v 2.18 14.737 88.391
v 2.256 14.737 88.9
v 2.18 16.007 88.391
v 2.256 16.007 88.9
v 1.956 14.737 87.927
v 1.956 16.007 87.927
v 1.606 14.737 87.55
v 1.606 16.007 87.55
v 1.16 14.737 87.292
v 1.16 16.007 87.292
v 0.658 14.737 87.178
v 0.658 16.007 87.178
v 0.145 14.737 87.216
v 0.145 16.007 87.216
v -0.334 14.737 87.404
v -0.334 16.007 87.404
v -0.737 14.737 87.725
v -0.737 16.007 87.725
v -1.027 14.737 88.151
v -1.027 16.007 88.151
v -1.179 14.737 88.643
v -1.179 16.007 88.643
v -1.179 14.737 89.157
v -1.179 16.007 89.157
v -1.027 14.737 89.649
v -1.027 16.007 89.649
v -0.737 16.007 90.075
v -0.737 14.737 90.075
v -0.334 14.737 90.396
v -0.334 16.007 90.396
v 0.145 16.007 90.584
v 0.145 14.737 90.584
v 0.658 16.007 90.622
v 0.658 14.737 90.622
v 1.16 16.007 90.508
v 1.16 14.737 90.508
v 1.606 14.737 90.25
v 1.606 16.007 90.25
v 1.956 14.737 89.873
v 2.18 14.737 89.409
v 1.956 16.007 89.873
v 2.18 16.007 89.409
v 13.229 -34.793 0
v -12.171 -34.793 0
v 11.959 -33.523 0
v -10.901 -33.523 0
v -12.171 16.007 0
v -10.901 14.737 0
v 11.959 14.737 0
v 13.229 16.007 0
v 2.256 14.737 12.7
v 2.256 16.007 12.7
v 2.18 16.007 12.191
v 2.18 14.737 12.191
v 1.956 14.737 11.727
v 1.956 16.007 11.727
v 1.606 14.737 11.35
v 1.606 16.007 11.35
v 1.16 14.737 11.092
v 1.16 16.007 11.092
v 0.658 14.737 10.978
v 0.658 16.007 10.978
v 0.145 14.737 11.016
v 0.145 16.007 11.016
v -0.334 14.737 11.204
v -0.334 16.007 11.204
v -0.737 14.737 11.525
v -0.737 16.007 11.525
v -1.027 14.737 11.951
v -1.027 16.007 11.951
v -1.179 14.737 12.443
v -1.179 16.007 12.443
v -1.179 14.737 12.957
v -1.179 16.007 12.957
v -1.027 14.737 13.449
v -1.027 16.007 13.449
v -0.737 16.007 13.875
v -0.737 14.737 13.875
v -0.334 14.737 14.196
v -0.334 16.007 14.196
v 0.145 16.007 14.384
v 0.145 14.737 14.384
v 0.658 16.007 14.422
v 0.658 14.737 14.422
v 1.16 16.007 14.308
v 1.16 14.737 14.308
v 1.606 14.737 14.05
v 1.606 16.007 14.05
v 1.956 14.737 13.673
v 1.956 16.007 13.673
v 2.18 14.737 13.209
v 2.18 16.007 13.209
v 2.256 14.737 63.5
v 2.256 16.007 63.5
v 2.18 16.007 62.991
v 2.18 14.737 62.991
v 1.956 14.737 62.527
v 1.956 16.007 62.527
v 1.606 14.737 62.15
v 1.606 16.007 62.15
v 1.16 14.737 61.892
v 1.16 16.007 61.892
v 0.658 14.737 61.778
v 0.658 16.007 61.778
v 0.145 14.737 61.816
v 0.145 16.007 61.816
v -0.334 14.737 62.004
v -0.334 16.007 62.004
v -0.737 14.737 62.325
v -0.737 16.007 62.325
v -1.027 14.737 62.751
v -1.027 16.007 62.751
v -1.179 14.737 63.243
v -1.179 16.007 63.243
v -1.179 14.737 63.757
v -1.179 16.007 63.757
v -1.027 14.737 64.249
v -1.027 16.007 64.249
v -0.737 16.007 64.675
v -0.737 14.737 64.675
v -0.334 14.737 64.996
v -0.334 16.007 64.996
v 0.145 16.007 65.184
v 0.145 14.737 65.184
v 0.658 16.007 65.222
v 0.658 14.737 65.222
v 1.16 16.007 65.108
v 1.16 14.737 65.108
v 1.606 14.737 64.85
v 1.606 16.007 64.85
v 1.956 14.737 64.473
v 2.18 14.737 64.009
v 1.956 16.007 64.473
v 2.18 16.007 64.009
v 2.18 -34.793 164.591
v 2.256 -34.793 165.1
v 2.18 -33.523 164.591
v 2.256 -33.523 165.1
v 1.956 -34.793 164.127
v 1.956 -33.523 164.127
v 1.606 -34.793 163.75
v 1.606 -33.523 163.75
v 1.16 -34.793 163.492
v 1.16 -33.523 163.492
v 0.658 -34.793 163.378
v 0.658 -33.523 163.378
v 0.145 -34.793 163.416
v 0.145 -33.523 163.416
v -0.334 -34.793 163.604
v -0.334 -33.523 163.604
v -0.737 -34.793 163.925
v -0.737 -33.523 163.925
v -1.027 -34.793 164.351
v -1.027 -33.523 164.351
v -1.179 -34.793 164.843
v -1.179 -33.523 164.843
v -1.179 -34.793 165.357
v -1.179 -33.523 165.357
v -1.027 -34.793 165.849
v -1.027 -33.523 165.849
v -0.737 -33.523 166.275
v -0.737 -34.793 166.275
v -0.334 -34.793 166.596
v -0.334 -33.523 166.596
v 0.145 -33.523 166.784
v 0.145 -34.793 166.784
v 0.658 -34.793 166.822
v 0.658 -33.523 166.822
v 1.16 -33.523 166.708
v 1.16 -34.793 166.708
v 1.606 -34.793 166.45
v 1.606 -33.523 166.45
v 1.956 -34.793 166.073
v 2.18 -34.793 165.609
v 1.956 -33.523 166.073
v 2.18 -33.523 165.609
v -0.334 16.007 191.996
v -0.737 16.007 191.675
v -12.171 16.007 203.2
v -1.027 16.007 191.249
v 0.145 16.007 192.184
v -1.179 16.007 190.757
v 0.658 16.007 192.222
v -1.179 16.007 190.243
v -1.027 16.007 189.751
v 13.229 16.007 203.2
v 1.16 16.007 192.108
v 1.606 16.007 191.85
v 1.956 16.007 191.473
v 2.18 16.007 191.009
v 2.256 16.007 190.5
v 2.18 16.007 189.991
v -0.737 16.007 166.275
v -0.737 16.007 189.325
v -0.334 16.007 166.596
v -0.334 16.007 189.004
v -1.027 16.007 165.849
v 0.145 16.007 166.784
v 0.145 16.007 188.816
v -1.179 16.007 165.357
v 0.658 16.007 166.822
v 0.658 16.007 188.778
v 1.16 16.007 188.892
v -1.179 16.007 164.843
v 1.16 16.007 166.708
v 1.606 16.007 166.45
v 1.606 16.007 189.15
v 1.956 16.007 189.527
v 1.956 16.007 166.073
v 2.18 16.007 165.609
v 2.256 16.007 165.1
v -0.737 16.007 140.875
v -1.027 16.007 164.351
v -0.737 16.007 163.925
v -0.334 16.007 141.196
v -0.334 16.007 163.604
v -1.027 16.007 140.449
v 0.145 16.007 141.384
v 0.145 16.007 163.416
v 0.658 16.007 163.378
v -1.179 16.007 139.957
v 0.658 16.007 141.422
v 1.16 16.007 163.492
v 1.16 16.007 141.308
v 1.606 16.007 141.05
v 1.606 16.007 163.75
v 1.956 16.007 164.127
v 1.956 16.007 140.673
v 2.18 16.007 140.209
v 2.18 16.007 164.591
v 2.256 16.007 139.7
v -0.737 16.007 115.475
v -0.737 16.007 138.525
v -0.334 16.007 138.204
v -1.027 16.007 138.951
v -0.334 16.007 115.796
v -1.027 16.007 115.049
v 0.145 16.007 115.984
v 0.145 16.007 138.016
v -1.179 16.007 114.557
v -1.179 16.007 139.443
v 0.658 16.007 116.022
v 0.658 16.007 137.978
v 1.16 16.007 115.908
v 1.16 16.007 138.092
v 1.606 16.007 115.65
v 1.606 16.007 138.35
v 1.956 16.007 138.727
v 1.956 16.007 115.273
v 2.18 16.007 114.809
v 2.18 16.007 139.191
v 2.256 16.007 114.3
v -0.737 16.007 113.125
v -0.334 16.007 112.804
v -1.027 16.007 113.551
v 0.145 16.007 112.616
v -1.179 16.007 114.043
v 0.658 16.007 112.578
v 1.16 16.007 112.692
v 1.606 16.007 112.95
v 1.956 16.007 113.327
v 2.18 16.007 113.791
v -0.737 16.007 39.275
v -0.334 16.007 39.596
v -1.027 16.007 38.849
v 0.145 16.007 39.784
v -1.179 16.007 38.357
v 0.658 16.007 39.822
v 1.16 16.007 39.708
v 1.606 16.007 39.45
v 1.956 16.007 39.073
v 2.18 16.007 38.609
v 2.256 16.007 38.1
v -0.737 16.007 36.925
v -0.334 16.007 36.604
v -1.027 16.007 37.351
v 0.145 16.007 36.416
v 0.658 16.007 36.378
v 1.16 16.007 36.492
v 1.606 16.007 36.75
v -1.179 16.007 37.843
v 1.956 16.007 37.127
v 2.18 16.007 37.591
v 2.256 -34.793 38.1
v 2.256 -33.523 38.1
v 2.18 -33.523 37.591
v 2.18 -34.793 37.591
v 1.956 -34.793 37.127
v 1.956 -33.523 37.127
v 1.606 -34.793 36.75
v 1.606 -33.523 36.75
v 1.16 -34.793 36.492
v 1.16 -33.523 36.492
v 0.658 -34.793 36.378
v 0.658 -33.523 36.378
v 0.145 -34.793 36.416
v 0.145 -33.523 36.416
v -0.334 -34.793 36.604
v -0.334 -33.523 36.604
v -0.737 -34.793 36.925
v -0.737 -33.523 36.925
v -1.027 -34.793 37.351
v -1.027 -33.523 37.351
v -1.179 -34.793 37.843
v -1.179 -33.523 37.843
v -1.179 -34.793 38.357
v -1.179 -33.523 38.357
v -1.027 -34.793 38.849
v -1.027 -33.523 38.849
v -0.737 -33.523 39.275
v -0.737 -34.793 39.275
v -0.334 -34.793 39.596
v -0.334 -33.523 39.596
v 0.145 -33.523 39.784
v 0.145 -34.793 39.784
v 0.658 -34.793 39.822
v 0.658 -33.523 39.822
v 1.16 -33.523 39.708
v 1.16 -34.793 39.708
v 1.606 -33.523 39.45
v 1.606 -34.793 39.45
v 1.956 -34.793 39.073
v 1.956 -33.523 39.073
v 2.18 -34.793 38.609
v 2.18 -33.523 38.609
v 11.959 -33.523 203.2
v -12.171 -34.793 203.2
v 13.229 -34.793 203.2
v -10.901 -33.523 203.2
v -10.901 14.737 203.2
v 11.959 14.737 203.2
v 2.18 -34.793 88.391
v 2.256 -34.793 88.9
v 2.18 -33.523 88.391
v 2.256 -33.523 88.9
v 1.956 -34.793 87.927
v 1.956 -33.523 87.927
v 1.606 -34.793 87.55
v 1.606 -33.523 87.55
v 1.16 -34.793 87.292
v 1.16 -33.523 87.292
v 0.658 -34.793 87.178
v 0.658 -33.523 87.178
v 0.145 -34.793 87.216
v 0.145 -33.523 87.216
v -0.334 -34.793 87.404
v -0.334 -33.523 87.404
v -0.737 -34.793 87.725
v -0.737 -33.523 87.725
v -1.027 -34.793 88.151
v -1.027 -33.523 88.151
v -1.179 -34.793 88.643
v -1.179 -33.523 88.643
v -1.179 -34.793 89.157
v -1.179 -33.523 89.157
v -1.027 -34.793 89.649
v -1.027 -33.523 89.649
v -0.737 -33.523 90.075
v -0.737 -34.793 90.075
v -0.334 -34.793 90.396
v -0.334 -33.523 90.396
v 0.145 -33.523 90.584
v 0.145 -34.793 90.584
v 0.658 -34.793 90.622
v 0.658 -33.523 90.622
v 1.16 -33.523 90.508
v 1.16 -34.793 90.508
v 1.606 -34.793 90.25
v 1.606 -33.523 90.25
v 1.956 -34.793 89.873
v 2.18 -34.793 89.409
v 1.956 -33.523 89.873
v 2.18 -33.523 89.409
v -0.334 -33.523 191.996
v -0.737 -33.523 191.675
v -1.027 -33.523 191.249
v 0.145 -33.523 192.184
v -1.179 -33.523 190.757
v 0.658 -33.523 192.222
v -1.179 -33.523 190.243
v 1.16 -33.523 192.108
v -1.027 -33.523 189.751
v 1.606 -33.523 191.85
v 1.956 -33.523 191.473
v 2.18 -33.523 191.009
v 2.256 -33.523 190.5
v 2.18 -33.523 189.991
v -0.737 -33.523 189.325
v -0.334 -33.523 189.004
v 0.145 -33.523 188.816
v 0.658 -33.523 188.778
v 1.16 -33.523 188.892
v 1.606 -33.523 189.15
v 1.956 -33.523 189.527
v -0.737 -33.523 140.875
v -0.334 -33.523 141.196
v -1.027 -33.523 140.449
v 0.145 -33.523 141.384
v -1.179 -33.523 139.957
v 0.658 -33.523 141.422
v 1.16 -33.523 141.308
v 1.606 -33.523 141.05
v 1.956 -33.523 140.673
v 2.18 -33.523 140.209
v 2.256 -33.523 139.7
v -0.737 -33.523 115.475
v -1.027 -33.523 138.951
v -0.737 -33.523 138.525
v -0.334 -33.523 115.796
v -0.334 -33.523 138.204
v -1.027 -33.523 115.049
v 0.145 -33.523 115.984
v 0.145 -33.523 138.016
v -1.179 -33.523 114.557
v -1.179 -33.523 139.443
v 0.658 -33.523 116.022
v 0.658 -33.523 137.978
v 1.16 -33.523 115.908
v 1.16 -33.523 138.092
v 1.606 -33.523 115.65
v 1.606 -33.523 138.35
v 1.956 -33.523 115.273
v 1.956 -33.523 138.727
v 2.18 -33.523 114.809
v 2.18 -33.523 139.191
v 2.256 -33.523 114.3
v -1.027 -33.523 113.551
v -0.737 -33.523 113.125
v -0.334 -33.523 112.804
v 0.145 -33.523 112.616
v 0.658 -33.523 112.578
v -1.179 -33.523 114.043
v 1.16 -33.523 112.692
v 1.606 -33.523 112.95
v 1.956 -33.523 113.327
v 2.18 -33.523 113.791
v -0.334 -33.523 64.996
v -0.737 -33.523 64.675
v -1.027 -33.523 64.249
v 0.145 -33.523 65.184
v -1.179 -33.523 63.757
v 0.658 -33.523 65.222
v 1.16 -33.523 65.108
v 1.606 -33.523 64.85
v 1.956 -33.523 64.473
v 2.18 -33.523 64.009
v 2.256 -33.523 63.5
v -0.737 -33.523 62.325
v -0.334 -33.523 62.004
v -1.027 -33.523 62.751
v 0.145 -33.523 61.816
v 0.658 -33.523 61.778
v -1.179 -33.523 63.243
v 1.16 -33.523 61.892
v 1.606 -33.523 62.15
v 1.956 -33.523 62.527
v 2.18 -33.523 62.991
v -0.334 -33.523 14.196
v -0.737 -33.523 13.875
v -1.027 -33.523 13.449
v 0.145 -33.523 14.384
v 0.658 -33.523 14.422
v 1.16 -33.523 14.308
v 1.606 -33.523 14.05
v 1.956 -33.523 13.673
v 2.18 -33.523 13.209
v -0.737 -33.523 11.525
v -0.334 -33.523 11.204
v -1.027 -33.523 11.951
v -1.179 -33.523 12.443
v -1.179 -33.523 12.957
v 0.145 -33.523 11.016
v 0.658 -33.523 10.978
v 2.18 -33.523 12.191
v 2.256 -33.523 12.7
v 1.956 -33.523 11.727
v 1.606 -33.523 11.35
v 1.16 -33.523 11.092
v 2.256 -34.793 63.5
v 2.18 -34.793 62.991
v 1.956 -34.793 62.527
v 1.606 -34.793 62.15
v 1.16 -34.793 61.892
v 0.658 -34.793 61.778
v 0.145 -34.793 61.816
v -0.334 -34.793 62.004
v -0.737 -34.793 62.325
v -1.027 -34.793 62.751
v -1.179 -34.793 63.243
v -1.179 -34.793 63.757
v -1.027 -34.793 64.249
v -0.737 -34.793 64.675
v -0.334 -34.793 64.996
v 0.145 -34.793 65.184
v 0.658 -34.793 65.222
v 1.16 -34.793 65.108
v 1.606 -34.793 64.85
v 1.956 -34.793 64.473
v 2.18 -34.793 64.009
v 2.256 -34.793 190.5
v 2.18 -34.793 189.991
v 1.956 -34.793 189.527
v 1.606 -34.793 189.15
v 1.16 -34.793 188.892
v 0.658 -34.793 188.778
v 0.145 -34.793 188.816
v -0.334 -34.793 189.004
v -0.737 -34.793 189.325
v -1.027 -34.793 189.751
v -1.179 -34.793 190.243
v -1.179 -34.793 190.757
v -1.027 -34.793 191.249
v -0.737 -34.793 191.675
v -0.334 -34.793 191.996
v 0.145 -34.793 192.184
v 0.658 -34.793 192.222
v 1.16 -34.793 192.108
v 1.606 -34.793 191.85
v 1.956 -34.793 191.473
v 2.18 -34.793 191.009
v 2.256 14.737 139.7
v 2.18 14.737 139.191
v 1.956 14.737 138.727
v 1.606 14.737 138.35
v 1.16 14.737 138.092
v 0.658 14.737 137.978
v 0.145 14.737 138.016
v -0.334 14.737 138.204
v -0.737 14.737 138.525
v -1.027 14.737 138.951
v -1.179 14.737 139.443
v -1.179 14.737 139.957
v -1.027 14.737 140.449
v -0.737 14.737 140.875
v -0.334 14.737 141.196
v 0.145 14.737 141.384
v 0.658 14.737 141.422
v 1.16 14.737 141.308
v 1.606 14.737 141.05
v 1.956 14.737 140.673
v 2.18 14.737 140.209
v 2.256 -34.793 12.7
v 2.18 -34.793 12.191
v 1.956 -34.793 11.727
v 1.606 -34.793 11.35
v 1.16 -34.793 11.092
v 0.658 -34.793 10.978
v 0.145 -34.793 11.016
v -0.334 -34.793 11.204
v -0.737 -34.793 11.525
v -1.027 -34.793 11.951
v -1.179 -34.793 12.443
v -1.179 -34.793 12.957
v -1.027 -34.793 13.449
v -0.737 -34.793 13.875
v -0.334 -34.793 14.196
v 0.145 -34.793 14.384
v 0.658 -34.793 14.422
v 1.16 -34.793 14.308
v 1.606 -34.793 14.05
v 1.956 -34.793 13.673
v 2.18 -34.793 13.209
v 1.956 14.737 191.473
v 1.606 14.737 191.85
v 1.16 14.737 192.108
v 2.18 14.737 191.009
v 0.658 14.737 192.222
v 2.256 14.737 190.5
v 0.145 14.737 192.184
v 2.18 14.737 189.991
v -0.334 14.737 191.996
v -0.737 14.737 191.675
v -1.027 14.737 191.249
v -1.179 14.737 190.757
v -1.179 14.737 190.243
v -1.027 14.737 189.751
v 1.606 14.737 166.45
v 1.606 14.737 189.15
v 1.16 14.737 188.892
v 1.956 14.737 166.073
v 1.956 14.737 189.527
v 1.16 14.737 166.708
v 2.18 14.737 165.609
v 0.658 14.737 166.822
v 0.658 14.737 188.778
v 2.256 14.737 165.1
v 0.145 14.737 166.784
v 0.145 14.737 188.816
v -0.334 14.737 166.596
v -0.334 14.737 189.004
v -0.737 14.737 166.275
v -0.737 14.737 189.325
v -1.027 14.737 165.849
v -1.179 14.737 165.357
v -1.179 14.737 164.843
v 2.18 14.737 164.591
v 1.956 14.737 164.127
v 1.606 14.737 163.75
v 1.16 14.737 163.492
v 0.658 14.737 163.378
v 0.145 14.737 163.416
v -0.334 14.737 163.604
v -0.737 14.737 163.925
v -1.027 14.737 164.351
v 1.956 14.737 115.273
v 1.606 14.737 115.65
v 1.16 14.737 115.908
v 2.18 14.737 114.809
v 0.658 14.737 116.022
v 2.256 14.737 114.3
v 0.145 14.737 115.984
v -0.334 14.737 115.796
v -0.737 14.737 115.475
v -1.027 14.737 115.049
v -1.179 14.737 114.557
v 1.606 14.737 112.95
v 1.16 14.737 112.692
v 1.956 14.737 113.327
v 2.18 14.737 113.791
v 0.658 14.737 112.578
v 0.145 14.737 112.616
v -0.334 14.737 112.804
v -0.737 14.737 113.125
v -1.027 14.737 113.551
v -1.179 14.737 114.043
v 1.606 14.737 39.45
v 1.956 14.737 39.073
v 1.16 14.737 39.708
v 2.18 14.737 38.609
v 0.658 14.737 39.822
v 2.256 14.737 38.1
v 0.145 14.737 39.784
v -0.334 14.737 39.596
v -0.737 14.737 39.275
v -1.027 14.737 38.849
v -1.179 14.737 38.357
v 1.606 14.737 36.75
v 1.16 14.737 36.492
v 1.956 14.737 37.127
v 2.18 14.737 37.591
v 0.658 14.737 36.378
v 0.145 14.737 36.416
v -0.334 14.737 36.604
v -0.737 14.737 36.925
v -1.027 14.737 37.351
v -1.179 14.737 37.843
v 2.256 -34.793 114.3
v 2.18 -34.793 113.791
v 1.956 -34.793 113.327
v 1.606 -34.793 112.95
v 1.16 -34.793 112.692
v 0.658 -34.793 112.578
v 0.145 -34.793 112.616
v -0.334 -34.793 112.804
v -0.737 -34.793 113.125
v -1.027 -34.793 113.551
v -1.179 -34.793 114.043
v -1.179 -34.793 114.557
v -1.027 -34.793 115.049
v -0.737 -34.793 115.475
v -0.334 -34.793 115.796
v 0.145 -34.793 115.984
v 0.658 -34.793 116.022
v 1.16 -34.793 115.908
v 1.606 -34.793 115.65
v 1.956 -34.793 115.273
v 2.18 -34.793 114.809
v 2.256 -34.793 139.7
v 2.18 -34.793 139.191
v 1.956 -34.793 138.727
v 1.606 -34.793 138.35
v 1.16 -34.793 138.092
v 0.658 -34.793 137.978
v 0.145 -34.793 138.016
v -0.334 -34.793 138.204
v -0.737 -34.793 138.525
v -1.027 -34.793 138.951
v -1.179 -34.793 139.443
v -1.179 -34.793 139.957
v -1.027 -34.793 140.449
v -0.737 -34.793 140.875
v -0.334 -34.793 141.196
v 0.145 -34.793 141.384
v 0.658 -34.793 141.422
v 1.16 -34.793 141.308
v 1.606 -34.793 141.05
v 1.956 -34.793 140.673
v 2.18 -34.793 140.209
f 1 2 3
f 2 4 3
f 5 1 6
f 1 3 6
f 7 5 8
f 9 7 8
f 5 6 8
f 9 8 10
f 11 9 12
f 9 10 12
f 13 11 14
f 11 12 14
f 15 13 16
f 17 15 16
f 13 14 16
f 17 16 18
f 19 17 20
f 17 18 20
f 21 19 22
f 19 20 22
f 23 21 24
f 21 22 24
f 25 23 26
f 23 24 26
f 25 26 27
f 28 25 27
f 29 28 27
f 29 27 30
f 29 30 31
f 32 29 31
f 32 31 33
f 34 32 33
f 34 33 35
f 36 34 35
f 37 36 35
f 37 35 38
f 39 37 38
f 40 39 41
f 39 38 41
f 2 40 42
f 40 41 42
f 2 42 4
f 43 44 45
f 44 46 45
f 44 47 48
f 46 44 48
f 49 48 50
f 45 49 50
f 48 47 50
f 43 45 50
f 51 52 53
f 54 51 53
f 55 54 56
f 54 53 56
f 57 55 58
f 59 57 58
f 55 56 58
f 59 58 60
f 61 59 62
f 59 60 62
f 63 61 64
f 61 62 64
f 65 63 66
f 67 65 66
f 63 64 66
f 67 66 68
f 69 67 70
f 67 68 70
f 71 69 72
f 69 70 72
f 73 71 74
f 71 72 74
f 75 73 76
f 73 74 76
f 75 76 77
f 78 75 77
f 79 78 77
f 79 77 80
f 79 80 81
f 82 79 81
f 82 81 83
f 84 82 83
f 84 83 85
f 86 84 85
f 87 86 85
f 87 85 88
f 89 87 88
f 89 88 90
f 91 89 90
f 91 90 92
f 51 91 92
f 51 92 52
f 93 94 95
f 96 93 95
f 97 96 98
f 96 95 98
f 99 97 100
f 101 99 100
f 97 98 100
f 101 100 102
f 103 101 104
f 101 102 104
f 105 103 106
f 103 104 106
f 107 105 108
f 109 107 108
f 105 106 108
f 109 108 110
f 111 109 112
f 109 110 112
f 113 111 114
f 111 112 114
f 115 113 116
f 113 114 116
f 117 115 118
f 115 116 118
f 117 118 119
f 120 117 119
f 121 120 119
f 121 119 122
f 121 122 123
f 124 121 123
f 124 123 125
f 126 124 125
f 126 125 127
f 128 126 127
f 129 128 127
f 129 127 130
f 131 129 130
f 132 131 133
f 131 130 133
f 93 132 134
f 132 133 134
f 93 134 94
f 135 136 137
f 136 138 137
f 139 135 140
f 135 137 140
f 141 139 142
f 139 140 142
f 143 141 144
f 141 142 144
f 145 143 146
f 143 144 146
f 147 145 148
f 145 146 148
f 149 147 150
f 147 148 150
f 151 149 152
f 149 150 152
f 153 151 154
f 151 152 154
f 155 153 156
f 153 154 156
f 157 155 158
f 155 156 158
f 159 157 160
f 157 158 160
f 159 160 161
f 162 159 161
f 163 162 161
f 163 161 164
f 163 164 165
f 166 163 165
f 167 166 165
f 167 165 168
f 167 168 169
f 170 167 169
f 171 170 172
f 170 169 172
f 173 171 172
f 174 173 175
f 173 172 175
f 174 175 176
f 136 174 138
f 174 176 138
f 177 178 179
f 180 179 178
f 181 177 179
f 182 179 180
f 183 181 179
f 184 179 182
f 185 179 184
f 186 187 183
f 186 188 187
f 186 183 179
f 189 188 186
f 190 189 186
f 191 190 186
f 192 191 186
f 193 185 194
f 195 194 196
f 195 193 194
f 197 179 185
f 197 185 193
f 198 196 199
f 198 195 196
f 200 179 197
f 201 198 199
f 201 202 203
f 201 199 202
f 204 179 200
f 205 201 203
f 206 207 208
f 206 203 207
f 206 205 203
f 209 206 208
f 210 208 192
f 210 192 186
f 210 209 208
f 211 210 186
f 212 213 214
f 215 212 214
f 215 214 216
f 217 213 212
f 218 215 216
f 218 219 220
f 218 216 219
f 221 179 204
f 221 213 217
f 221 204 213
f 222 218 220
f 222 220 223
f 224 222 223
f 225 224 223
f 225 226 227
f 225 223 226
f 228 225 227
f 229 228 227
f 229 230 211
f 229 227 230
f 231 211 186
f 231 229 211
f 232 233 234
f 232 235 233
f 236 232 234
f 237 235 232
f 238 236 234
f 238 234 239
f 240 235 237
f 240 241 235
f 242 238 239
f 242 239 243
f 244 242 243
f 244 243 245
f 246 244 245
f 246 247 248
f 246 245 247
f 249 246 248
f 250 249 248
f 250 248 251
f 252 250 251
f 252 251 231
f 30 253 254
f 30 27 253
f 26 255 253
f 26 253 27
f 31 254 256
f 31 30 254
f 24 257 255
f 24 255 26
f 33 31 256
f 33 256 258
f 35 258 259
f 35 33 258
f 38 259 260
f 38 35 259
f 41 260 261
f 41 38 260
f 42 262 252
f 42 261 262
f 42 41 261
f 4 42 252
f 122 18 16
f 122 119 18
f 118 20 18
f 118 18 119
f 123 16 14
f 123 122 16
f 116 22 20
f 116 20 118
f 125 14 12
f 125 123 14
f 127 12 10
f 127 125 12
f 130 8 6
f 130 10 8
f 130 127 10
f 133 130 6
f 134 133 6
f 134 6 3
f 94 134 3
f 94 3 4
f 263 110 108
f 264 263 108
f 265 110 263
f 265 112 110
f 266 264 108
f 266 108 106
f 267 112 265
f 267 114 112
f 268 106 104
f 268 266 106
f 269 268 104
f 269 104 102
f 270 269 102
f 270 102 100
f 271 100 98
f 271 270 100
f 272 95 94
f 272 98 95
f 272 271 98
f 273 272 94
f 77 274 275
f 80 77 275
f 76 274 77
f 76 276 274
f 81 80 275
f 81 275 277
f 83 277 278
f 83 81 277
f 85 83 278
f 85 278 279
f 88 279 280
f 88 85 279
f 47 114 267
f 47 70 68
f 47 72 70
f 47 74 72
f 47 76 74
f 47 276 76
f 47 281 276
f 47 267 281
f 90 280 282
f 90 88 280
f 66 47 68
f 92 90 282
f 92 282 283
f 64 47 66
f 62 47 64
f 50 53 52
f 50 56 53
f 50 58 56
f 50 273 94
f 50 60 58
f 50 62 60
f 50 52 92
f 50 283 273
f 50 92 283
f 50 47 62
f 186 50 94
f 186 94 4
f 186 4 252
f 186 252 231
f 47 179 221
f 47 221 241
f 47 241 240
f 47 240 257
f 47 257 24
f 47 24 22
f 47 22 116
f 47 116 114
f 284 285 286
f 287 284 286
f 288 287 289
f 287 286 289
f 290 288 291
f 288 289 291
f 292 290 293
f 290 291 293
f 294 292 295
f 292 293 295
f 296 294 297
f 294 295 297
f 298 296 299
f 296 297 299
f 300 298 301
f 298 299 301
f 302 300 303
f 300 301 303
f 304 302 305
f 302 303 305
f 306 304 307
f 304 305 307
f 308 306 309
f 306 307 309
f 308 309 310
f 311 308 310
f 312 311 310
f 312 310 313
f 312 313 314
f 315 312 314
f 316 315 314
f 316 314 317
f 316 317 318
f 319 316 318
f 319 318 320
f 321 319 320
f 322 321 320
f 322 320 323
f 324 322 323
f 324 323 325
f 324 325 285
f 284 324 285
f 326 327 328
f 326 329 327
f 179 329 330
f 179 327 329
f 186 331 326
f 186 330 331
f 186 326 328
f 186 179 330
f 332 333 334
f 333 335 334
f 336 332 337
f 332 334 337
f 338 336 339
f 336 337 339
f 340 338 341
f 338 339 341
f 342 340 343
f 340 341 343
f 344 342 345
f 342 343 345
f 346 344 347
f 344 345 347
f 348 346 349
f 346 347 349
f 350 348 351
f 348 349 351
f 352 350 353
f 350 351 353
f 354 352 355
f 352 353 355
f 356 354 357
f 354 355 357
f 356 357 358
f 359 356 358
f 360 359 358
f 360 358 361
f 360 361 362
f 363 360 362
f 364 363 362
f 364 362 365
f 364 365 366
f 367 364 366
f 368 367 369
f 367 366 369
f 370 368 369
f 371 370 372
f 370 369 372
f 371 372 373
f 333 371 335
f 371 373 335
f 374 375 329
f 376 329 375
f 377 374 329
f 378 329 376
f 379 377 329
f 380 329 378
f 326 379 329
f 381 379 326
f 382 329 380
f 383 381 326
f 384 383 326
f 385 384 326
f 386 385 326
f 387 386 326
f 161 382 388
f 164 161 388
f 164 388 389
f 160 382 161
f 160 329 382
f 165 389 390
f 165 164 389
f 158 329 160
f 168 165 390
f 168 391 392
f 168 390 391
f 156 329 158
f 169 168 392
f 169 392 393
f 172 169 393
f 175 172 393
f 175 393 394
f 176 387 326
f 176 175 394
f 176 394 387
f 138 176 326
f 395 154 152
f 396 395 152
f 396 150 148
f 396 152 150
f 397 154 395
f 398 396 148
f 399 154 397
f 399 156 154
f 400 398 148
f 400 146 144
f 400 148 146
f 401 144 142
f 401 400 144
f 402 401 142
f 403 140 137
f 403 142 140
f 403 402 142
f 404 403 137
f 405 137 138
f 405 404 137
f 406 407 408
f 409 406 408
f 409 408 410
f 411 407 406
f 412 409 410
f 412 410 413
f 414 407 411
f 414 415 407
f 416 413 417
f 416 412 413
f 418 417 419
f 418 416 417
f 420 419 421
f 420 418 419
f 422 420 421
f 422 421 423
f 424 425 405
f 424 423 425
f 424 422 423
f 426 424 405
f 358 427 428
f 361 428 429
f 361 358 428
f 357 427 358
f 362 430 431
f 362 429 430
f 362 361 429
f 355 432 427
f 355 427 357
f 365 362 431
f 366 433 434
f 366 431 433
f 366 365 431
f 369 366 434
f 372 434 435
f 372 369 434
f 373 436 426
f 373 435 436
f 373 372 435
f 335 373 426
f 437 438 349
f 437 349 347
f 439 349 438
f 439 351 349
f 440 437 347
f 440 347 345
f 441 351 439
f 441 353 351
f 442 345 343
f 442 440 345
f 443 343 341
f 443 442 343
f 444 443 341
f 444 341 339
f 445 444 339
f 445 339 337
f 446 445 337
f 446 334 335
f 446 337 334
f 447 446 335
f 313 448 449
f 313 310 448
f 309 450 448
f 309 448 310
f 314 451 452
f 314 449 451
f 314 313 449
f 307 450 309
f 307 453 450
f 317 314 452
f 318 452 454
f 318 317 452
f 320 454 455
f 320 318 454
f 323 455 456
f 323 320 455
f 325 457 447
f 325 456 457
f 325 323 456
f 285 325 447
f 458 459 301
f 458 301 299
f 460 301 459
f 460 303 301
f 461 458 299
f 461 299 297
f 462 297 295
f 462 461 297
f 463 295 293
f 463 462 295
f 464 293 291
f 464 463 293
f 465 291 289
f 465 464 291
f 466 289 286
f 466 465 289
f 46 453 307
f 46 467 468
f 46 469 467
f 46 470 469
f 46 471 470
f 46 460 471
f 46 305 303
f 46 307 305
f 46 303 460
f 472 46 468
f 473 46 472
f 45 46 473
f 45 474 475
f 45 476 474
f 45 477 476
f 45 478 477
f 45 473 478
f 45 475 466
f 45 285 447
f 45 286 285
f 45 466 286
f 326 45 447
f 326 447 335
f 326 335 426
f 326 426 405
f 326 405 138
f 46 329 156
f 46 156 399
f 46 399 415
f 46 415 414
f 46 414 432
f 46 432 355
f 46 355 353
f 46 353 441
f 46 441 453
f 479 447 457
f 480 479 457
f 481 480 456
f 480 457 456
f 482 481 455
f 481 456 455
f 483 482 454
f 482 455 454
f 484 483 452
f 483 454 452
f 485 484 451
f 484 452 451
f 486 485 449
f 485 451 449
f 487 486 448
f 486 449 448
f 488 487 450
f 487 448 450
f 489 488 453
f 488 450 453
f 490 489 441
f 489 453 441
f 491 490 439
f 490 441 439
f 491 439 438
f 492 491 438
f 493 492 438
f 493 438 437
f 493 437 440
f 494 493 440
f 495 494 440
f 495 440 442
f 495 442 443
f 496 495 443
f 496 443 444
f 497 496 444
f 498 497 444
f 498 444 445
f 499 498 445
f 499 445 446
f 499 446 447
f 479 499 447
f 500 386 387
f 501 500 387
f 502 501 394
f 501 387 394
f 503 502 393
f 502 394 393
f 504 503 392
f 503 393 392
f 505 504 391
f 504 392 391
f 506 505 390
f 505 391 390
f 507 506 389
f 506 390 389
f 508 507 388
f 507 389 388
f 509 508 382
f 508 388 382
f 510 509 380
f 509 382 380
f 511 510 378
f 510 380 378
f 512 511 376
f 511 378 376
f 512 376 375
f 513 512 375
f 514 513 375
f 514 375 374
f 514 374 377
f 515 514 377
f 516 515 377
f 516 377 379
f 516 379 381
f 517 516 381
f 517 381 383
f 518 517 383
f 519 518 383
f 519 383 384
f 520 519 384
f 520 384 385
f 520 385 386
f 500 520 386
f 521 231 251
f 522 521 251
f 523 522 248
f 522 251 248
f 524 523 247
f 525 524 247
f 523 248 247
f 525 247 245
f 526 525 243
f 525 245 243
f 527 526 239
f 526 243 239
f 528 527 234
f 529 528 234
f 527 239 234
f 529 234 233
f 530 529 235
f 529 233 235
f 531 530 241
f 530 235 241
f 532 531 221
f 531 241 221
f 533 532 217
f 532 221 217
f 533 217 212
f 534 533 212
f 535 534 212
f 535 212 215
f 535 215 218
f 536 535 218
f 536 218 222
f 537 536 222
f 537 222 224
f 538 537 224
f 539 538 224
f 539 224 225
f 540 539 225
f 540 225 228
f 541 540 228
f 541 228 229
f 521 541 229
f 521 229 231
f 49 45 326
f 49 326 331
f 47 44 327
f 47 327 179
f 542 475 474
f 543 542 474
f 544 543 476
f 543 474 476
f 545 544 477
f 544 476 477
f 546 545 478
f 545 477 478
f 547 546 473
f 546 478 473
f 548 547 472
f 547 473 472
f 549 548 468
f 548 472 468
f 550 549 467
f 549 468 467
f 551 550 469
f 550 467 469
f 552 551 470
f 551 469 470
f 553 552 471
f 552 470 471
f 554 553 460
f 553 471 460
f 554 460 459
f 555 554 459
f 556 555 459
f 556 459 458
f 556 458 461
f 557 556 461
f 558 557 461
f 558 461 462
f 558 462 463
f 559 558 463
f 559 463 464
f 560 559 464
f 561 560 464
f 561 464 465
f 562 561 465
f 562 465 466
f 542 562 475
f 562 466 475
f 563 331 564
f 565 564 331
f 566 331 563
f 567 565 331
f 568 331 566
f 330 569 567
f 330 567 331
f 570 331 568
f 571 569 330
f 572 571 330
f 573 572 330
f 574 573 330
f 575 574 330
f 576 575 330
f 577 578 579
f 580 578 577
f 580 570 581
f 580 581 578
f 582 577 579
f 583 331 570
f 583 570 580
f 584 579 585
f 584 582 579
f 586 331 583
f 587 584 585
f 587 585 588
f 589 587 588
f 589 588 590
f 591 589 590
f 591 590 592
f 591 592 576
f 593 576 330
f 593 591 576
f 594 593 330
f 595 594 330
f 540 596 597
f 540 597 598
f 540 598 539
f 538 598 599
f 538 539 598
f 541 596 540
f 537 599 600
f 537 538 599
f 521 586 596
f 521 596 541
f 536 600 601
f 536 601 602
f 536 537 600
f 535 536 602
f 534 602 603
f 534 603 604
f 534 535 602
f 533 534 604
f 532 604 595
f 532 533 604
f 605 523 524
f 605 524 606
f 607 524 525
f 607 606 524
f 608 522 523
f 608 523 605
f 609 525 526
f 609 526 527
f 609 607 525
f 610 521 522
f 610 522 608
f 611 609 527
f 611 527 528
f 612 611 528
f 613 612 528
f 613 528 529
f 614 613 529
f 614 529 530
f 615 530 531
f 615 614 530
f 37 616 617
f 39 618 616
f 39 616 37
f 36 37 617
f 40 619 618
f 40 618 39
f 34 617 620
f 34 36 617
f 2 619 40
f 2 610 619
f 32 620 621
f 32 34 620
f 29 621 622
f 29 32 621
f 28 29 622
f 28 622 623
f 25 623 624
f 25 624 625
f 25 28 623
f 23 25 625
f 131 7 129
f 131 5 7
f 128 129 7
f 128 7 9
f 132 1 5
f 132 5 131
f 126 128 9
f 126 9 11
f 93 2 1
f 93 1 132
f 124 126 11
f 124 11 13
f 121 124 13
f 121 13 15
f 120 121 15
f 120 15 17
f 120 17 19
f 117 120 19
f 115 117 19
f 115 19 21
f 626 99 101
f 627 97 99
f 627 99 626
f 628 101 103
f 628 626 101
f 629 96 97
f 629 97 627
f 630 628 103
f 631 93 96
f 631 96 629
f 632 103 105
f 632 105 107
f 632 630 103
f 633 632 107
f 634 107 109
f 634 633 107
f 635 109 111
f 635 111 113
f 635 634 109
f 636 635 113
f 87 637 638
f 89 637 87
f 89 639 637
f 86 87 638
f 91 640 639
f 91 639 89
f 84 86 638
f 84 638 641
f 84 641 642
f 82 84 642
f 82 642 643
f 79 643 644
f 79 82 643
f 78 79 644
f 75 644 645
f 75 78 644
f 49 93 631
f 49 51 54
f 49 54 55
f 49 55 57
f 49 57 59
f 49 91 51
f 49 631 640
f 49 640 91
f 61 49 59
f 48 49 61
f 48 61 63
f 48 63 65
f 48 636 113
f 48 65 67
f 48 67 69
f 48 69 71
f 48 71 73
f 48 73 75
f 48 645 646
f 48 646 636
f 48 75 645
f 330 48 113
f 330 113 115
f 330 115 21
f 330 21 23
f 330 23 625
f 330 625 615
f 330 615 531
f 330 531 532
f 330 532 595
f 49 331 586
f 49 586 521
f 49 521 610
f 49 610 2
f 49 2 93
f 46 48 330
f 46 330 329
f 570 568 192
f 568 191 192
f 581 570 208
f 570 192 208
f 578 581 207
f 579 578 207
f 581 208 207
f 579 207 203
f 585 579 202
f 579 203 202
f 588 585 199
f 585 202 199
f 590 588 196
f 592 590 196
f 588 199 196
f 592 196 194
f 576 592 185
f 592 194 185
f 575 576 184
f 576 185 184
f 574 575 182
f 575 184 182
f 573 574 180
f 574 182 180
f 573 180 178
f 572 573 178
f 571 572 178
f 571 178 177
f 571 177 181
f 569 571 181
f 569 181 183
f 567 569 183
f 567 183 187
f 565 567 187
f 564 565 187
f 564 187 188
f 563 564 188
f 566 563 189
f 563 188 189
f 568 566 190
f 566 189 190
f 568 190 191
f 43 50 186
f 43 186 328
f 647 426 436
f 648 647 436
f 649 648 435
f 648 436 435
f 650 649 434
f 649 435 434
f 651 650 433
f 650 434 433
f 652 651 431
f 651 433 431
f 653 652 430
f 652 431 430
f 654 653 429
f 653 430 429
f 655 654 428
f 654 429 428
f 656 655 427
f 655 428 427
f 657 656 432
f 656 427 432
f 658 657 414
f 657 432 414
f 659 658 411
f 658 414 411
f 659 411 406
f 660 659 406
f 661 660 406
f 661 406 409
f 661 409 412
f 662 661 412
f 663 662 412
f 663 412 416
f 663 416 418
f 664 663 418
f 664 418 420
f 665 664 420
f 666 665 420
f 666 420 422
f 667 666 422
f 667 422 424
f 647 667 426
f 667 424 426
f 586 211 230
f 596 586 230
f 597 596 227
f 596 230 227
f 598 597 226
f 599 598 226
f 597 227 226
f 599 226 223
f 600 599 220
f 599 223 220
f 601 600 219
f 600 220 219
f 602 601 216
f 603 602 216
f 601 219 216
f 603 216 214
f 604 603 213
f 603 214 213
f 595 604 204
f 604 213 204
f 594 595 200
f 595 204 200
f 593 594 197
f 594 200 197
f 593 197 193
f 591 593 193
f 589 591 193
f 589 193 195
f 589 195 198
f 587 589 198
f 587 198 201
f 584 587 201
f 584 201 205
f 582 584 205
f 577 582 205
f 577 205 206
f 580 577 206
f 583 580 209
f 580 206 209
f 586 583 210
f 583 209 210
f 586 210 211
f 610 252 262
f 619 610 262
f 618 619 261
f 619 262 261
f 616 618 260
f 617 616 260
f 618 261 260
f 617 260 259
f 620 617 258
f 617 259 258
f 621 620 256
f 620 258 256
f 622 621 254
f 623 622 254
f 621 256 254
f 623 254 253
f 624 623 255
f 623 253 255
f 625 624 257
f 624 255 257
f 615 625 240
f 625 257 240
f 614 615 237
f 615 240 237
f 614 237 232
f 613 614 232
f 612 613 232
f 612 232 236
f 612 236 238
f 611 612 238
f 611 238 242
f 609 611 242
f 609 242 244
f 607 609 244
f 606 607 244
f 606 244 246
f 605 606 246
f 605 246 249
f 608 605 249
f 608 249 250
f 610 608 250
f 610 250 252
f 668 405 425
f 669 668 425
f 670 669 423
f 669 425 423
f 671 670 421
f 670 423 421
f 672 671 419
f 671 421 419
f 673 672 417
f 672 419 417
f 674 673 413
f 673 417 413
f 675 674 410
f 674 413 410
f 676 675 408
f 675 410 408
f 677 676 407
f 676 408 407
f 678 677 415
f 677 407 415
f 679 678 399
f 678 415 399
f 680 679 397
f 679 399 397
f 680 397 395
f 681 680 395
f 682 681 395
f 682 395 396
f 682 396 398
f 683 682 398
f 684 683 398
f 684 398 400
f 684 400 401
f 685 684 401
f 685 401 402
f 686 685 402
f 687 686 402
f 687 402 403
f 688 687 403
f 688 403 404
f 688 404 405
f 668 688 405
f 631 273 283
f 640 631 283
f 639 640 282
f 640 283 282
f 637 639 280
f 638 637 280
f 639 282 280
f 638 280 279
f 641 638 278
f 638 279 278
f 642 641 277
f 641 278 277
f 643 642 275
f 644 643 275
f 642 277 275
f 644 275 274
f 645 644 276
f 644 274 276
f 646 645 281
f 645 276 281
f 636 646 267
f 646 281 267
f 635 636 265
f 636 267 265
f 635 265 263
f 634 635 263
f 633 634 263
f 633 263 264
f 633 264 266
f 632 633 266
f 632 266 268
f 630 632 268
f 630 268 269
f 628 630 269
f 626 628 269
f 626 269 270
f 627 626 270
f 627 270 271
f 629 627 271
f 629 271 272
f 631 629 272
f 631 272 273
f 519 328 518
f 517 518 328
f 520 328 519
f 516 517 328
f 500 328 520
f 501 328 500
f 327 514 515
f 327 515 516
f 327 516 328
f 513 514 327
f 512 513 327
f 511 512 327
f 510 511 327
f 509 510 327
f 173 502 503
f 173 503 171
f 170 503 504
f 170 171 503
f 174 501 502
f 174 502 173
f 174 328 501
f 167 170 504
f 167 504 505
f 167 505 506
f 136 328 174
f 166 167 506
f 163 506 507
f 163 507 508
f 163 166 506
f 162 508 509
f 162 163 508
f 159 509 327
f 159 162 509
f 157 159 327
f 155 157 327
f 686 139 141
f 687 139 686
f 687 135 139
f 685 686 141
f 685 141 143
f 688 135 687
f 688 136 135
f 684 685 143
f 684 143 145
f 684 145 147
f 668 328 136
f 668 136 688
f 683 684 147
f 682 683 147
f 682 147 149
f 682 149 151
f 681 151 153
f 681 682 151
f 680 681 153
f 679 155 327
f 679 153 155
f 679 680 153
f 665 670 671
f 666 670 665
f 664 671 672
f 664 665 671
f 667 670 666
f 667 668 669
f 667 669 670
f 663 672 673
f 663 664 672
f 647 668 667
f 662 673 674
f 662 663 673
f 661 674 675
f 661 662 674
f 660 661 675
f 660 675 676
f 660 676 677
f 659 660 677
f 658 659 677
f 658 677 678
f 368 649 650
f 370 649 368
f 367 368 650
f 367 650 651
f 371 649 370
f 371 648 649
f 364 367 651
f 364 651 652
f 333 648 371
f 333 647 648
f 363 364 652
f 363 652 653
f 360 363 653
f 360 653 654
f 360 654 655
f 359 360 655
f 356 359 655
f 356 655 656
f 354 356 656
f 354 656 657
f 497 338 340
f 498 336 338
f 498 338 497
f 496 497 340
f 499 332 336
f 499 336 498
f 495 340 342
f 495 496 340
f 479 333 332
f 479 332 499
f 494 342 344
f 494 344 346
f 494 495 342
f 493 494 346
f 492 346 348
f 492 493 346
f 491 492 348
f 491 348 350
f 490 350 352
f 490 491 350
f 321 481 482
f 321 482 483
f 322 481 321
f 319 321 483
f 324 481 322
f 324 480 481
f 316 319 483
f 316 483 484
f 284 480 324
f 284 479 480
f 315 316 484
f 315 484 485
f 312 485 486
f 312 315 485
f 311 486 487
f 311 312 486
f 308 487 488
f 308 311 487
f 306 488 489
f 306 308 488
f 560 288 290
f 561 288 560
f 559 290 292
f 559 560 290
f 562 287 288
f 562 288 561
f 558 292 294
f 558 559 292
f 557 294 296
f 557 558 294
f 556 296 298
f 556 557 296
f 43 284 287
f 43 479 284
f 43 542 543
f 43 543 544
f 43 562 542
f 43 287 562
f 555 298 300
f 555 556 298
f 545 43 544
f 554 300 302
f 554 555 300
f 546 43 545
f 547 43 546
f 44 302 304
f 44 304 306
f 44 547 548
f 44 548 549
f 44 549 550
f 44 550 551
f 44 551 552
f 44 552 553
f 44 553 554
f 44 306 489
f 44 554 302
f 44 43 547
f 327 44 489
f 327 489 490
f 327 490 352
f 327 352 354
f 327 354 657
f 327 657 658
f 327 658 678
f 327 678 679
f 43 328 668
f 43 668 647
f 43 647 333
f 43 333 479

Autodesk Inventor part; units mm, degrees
ref_plane "YZ Plane" through (0, 0, 0) normal (1, 0, 0) x (0, 1, 0)
ref_plane "XZ Plane" through (0, 0, 0) normal (0, 1, 0) x (-1, 0, 0)
ref_plane "XY Plane" through (0, 0, 0) normal (0, 0, 1) x (1, 0, 0)
sketch "Sketch1" plane through (0, 0, 0) normal (0, 0, 1) x (1, 0, 0)
  line L0 (-12.1708, 16.0073) -> (13.2292, 16.0073)
  line L1 (13.2292, 16.0073) -> (13.2292, -34.7927)
  line L2 (13.2292, -34.7927) -> (-12.1708, -34.7927)
  line L3 (-12.1708, -34.7927) -> (-12.1708, 16.0073)
  line L4 (11.9592, 14.7373) -> (-10.9008, 14.7373)
  line L5 (-10.9008, 14.7373) -> (-10.9008, -33.5227)
  line L6 (-10.9008, -33.5227) -> (11.9592, -33.5227)
  line L7 (11.9592, -33.5227) -> (11.9592, 14.7373)
  point P0 (0, 0)
  dimension "d0" = 25.4
  dimension "d1" = 50.8
  dimension "d2" = 1.27
extrude "Extrusion1" add sketch "Sketch1" along normal blind 203.2
sketch "Sketch2" plane through (-12.1708, 16.0073, 0) normal (0, 1, 0) x (1, 0, 0)
  circle A0 centre (12.7, -12.7) radius 1.7272
  line L0 (25.4, 0) -> (0, 0) projected
  line L1 (0, 0) -> (0, -203.2) projected
  point P0 (12.1708, 0)
  dimension "d5" = 3.4544
  dimension "d6" = 12.7
  dimension "d7" = 12.7
extrude "Extrusion2" cut sketch "Sketch2" against normal through all
pattern_linear "Rectangular Pattern1" count 20 spacing 25.4 along (0, 0, 1) of "Extrusion2"
equation "\"d3\" = d13"
equation "\"d10\" = d14"
equation "\"d13\" = 203.2"
equation "\"d14\" = d13"
properties part number "VersaFrame (Gripper-StationaryLong)"
